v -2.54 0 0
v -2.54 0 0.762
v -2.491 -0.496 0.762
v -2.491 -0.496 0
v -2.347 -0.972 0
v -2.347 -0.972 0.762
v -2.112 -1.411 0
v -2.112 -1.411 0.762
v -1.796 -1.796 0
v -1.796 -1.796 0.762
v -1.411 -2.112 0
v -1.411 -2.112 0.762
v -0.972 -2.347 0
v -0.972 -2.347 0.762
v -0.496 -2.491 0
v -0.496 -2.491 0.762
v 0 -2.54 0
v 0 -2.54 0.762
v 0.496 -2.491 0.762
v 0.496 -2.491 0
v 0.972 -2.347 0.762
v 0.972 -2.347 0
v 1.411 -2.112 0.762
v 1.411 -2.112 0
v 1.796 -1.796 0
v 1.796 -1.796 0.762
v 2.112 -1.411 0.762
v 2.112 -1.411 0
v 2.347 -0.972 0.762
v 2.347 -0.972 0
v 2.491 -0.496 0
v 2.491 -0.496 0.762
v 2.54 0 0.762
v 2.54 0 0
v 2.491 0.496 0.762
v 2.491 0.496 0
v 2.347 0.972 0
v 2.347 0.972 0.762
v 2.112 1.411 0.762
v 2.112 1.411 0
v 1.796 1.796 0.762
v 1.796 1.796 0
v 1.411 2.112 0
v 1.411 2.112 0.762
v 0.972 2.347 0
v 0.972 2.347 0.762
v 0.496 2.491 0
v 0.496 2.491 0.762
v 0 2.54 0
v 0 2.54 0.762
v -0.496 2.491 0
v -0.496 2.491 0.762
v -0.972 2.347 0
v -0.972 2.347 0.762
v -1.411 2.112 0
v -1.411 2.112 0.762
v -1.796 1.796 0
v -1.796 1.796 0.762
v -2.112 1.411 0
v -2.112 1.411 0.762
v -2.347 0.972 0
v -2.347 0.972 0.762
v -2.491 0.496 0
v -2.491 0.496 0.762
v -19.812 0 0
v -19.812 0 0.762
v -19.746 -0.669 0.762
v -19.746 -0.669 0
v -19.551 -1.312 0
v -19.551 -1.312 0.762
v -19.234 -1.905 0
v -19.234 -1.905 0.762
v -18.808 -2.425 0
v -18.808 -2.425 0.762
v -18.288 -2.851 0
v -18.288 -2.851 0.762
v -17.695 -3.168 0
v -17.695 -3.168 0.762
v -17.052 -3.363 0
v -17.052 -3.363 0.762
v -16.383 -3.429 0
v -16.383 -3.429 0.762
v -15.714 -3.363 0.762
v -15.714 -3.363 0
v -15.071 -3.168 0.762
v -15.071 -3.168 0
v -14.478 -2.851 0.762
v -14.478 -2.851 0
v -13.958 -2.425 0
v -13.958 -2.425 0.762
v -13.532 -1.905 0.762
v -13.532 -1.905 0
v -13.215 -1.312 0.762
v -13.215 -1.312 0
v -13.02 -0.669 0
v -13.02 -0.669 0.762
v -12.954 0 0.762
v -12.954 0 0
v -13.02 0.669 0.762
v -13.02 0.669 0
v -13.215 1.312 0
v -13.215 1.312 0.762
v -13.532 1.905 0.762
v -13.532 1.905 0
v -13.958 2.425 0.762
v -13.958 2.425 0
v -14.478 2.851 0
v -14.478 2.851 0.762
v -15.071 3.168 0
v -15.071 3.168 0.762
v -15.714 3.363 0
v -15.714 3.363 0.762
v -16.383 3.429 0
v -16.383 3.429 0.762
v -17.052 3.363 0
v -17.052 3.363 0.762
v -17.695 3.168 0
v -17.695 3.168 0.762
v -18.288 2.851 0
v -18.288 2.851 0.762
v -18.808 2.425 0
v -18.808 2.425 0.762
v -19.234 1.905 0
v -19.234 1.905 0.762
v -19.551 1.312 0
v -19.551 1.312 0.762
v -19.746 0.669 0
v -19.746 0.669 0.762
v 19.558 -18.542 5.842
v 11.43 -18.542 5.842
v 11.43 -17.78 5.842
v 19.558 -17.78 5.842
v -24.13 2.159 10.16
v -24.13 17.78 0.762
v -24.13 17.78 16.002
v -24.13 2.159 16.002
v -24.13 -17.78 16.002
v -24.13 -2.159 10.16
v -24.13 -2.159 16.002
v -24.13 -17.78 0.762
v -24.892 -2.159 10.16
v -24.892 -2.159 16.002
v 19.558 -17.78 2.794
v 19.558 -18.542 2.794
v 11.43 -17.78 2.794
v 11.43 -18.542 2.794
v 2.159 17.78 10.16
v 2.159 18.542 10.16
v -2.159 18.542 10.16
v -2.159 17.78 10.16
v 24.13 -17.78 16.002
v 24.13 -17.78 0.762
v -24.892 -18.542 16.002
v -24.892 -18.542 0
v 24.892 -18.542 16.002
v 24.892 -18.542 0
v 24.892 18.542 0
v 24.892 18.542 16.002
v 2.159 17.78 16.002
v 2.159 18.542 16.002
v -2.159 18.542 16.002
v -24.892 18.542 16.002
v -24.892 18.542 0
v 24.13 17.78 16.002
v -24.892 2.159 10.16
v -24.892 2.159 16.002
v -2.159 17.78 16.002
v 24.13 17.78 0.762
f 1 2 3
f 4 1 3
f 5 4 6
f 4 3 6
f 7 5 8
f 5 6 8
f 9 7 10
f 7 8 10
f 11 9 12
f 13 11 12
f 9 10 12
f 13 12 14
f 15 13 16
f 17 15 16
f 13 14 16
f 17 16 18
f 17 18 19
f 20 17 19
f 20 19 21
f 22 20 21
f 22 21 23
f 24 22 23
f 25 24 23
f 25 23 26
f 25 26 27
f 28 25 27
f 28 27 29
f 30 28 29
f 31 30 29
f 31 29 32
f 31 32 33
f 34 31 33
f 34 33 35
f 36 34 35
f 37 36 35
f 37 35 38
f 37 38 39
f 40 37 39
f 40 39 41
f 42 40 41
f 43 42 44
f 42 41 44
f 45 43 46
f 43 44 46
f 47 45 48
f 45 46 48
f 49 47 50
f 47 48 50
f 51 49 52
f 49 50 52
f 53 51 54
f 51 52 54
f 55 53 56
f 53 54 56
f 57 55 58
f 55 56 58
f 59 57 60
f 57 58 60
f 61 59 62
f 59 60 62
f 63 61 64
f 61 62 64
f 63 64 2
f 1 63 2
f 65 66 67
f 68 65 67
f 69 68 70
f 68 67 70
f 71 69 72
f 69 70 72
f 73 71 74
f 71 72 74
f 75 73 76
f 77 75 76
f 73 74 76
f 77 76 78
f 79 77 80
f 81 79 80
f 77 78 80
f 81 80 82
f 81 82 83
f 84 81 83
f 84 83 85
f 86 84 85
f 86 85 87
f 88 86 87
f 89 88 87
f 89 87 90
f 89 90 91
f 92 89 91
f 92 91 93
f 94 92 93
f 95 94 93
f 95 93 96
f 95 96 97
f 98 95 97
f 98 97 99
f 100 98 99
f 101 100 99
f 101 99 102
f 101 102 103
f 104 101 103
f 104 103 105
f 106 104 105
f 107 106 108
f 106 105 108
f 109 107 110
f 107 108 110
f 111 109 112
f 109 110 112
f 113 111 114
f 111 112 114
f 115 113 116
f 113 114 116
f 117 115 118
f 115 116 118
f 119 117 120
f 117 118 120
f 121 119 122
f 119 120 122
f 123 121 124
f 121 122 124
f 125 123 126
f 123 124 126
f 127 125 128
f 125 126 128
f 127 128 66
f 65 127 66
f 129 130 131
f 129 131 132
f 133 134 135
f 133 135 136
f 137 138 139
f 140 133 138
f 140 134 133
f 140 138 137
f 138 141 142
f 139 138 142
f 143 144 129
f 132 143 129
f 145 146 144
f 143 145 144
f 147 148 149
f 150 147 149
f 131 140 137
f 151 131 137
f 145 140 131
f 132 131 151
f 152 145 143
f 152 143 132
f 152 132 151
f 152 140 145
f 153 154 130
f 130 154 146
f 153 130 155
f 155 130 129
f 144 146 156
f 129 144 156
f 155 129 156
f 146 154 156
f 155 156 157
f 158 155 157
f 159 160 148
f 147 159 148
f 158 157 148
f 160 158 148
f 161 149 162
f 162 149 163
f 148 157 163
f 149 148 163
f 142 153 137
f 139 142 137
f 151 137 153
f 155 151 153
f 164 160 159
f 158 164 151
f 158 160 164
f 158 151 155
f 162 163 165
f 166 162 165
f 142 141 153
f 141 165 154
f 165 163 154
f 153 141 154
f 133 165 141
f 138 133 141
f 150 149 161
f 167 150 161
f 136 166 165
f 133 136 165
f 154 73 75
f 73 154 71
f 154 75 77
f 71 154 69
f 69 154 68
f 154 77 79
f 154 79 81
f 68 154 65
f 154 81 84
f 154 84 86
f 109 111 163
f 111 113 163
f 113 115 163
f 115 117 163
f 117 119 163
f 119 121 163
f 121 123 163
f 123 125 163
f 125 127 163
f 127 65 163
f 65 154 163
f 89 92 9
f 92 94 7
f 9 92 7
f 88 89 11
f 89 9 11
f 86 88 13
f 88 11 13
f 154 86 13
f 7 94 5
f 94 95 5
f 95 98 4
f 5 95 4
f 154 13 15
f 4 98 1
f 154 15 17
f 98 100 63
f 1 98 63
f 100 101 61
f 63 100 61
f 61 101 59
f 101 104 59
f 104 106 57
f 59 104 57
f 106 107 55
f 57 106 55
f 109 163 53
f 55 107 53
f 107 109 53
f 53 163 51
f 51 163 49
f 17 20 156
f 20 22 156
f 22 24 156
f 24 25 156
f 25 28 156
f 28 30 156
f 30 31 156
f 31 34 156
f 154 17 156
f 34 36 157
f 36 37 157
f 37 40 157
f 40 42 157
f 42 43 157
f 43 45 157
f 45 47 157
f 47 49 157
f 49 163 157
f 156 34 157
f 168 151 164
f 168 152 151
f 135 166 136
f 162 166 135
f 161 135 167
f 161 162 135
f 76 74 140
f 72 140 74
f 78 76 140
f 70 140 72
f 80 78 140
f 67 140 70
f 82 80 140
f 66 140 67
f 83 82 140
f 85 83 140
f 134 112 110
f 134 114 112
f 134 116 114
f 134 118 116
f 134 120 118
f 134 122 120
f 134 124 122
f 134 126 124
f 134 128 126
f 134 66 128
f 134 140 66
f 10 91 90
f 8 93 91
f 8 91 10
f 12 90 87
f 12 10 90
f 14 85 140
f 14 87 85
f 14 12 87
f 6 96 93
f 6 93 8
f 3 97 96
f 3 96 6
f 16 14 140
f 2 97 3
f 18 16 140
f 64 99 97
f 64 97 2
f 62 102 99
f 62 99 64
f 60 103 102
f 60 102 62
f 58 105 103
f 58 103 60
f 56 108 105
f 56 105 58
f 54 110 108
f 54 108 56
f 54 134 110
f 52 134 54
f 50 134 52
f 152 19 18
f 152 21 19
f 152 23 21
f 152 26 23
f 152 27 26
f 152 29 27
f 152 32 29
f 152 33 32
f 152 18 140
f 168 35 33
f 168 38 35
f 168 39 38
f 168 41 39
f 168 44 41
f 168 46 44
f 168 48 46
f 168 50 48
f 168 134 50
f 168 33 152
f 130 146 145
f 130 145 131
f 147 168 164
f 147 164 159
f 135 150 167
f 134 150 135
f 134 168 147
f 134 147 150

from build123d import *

# Parameters (mm, degrees)
F0_R      = 2.921
F1_DEPTH  = 16.002
F2_T      = -0.762
F3_D      = 6.858
F4_D      = 5.08
F5_W      = 8.128
F5_H      = 3.048
F6_DEPTH  = 25.4
F8_DEPTH  = 25.4
F10_DEPTH = 25.4


with BuildPart() as f1:
    # F0 (on Top) → F1 (new body)
    with BuildSketch(Plane.XY):
        Polygon((24.892, -18.542), (24.892, 18.542), (-24.892, 18.542), (-24.892, 0), (-24.892, -18.542), align=None)
        with BuildLine():
            ThreePointArc((-12.573, 0), (-16.383, -3.81), (-20.193, 0))
            ThreePointArc((-20.193, 0), (-16.383, 3.81), (-12.573, 0))
        make_face(mode=Mode.SUBTRACT)
        Circle(F0_R, mode=Mode.SUBTRACT)
        with BuildLine():
            ThreePointArc((-12.573, 0), (-16.383, 3.81), (-20.193, 0))
            ThreePointArc((-20.193, 0), (-16.383, -3.81), (-12.573, 0))
        make_face()
        Circle(F0_R)
    extrude(amount=F1_DEPTH)

    # F2
    f2_openings = [f1.faces().sort_by_distance(p)[0] for p in [
        (0, 0, 16.002),
    ]]
    offset(amount=F2_T, openings=f2_openings)

    # F3 (through all)
    with Locations(Plane(origin=(0, 0, 0), x_dir=(1, 0, 0), z_dir=(0, 0, -1))):
        with Locations((-16.383, 0)):
            Hole(F3_D / 2)

    # F4 (through all)
    with Locations(Plane(origin=(0, 0, 0), x_dir=(1, 0, 0), z_dir=(0, 0, -1))):
        with Locations((0, 0)):
            Hole(F4_D / 2)

    # F5 (on face) → F6 (cut)
    with BuildSketch(Plane.XZ.offset(18.542)):
        with Locations((15.494, 4.318)):
            Rectangle(F5_W, F5_H)
    extrude(amount=-F6_DEPTH, mode=Mode.SUBTRACT)

    # F7 (on face) → F8 (cut)
    with BuildSketch(Plane(origin=(0, 18.542, 0), x_dir=(-1, 0, 0), z_dir=(0, 1, 0))):
        Polygon((2.159, 10.16), (2.159, 16.002), (0, 16.002), (-2.159, 16.002), (-2.159, 10.16), align=None)
    extrude(amount=-F8_DEPTH, mode=Mode.SUBTRACT)

    # F9 (on face) → F10 (cut)
    with BuildSketch(Plane(origin=(-24.892, 0, 0), x_dir=(0, -1, 0), z_dir=(-1, 0, 0))):
        Polygon((2.159, 10.16), (2.159, 16.002), (0, 16.002), (-2.159, 16.002), (-2.159, 10.16), align=None)
    extrude(amount=-F10_DEPTH, mode=Mode.SUBTRACT)


solid = f1.part
